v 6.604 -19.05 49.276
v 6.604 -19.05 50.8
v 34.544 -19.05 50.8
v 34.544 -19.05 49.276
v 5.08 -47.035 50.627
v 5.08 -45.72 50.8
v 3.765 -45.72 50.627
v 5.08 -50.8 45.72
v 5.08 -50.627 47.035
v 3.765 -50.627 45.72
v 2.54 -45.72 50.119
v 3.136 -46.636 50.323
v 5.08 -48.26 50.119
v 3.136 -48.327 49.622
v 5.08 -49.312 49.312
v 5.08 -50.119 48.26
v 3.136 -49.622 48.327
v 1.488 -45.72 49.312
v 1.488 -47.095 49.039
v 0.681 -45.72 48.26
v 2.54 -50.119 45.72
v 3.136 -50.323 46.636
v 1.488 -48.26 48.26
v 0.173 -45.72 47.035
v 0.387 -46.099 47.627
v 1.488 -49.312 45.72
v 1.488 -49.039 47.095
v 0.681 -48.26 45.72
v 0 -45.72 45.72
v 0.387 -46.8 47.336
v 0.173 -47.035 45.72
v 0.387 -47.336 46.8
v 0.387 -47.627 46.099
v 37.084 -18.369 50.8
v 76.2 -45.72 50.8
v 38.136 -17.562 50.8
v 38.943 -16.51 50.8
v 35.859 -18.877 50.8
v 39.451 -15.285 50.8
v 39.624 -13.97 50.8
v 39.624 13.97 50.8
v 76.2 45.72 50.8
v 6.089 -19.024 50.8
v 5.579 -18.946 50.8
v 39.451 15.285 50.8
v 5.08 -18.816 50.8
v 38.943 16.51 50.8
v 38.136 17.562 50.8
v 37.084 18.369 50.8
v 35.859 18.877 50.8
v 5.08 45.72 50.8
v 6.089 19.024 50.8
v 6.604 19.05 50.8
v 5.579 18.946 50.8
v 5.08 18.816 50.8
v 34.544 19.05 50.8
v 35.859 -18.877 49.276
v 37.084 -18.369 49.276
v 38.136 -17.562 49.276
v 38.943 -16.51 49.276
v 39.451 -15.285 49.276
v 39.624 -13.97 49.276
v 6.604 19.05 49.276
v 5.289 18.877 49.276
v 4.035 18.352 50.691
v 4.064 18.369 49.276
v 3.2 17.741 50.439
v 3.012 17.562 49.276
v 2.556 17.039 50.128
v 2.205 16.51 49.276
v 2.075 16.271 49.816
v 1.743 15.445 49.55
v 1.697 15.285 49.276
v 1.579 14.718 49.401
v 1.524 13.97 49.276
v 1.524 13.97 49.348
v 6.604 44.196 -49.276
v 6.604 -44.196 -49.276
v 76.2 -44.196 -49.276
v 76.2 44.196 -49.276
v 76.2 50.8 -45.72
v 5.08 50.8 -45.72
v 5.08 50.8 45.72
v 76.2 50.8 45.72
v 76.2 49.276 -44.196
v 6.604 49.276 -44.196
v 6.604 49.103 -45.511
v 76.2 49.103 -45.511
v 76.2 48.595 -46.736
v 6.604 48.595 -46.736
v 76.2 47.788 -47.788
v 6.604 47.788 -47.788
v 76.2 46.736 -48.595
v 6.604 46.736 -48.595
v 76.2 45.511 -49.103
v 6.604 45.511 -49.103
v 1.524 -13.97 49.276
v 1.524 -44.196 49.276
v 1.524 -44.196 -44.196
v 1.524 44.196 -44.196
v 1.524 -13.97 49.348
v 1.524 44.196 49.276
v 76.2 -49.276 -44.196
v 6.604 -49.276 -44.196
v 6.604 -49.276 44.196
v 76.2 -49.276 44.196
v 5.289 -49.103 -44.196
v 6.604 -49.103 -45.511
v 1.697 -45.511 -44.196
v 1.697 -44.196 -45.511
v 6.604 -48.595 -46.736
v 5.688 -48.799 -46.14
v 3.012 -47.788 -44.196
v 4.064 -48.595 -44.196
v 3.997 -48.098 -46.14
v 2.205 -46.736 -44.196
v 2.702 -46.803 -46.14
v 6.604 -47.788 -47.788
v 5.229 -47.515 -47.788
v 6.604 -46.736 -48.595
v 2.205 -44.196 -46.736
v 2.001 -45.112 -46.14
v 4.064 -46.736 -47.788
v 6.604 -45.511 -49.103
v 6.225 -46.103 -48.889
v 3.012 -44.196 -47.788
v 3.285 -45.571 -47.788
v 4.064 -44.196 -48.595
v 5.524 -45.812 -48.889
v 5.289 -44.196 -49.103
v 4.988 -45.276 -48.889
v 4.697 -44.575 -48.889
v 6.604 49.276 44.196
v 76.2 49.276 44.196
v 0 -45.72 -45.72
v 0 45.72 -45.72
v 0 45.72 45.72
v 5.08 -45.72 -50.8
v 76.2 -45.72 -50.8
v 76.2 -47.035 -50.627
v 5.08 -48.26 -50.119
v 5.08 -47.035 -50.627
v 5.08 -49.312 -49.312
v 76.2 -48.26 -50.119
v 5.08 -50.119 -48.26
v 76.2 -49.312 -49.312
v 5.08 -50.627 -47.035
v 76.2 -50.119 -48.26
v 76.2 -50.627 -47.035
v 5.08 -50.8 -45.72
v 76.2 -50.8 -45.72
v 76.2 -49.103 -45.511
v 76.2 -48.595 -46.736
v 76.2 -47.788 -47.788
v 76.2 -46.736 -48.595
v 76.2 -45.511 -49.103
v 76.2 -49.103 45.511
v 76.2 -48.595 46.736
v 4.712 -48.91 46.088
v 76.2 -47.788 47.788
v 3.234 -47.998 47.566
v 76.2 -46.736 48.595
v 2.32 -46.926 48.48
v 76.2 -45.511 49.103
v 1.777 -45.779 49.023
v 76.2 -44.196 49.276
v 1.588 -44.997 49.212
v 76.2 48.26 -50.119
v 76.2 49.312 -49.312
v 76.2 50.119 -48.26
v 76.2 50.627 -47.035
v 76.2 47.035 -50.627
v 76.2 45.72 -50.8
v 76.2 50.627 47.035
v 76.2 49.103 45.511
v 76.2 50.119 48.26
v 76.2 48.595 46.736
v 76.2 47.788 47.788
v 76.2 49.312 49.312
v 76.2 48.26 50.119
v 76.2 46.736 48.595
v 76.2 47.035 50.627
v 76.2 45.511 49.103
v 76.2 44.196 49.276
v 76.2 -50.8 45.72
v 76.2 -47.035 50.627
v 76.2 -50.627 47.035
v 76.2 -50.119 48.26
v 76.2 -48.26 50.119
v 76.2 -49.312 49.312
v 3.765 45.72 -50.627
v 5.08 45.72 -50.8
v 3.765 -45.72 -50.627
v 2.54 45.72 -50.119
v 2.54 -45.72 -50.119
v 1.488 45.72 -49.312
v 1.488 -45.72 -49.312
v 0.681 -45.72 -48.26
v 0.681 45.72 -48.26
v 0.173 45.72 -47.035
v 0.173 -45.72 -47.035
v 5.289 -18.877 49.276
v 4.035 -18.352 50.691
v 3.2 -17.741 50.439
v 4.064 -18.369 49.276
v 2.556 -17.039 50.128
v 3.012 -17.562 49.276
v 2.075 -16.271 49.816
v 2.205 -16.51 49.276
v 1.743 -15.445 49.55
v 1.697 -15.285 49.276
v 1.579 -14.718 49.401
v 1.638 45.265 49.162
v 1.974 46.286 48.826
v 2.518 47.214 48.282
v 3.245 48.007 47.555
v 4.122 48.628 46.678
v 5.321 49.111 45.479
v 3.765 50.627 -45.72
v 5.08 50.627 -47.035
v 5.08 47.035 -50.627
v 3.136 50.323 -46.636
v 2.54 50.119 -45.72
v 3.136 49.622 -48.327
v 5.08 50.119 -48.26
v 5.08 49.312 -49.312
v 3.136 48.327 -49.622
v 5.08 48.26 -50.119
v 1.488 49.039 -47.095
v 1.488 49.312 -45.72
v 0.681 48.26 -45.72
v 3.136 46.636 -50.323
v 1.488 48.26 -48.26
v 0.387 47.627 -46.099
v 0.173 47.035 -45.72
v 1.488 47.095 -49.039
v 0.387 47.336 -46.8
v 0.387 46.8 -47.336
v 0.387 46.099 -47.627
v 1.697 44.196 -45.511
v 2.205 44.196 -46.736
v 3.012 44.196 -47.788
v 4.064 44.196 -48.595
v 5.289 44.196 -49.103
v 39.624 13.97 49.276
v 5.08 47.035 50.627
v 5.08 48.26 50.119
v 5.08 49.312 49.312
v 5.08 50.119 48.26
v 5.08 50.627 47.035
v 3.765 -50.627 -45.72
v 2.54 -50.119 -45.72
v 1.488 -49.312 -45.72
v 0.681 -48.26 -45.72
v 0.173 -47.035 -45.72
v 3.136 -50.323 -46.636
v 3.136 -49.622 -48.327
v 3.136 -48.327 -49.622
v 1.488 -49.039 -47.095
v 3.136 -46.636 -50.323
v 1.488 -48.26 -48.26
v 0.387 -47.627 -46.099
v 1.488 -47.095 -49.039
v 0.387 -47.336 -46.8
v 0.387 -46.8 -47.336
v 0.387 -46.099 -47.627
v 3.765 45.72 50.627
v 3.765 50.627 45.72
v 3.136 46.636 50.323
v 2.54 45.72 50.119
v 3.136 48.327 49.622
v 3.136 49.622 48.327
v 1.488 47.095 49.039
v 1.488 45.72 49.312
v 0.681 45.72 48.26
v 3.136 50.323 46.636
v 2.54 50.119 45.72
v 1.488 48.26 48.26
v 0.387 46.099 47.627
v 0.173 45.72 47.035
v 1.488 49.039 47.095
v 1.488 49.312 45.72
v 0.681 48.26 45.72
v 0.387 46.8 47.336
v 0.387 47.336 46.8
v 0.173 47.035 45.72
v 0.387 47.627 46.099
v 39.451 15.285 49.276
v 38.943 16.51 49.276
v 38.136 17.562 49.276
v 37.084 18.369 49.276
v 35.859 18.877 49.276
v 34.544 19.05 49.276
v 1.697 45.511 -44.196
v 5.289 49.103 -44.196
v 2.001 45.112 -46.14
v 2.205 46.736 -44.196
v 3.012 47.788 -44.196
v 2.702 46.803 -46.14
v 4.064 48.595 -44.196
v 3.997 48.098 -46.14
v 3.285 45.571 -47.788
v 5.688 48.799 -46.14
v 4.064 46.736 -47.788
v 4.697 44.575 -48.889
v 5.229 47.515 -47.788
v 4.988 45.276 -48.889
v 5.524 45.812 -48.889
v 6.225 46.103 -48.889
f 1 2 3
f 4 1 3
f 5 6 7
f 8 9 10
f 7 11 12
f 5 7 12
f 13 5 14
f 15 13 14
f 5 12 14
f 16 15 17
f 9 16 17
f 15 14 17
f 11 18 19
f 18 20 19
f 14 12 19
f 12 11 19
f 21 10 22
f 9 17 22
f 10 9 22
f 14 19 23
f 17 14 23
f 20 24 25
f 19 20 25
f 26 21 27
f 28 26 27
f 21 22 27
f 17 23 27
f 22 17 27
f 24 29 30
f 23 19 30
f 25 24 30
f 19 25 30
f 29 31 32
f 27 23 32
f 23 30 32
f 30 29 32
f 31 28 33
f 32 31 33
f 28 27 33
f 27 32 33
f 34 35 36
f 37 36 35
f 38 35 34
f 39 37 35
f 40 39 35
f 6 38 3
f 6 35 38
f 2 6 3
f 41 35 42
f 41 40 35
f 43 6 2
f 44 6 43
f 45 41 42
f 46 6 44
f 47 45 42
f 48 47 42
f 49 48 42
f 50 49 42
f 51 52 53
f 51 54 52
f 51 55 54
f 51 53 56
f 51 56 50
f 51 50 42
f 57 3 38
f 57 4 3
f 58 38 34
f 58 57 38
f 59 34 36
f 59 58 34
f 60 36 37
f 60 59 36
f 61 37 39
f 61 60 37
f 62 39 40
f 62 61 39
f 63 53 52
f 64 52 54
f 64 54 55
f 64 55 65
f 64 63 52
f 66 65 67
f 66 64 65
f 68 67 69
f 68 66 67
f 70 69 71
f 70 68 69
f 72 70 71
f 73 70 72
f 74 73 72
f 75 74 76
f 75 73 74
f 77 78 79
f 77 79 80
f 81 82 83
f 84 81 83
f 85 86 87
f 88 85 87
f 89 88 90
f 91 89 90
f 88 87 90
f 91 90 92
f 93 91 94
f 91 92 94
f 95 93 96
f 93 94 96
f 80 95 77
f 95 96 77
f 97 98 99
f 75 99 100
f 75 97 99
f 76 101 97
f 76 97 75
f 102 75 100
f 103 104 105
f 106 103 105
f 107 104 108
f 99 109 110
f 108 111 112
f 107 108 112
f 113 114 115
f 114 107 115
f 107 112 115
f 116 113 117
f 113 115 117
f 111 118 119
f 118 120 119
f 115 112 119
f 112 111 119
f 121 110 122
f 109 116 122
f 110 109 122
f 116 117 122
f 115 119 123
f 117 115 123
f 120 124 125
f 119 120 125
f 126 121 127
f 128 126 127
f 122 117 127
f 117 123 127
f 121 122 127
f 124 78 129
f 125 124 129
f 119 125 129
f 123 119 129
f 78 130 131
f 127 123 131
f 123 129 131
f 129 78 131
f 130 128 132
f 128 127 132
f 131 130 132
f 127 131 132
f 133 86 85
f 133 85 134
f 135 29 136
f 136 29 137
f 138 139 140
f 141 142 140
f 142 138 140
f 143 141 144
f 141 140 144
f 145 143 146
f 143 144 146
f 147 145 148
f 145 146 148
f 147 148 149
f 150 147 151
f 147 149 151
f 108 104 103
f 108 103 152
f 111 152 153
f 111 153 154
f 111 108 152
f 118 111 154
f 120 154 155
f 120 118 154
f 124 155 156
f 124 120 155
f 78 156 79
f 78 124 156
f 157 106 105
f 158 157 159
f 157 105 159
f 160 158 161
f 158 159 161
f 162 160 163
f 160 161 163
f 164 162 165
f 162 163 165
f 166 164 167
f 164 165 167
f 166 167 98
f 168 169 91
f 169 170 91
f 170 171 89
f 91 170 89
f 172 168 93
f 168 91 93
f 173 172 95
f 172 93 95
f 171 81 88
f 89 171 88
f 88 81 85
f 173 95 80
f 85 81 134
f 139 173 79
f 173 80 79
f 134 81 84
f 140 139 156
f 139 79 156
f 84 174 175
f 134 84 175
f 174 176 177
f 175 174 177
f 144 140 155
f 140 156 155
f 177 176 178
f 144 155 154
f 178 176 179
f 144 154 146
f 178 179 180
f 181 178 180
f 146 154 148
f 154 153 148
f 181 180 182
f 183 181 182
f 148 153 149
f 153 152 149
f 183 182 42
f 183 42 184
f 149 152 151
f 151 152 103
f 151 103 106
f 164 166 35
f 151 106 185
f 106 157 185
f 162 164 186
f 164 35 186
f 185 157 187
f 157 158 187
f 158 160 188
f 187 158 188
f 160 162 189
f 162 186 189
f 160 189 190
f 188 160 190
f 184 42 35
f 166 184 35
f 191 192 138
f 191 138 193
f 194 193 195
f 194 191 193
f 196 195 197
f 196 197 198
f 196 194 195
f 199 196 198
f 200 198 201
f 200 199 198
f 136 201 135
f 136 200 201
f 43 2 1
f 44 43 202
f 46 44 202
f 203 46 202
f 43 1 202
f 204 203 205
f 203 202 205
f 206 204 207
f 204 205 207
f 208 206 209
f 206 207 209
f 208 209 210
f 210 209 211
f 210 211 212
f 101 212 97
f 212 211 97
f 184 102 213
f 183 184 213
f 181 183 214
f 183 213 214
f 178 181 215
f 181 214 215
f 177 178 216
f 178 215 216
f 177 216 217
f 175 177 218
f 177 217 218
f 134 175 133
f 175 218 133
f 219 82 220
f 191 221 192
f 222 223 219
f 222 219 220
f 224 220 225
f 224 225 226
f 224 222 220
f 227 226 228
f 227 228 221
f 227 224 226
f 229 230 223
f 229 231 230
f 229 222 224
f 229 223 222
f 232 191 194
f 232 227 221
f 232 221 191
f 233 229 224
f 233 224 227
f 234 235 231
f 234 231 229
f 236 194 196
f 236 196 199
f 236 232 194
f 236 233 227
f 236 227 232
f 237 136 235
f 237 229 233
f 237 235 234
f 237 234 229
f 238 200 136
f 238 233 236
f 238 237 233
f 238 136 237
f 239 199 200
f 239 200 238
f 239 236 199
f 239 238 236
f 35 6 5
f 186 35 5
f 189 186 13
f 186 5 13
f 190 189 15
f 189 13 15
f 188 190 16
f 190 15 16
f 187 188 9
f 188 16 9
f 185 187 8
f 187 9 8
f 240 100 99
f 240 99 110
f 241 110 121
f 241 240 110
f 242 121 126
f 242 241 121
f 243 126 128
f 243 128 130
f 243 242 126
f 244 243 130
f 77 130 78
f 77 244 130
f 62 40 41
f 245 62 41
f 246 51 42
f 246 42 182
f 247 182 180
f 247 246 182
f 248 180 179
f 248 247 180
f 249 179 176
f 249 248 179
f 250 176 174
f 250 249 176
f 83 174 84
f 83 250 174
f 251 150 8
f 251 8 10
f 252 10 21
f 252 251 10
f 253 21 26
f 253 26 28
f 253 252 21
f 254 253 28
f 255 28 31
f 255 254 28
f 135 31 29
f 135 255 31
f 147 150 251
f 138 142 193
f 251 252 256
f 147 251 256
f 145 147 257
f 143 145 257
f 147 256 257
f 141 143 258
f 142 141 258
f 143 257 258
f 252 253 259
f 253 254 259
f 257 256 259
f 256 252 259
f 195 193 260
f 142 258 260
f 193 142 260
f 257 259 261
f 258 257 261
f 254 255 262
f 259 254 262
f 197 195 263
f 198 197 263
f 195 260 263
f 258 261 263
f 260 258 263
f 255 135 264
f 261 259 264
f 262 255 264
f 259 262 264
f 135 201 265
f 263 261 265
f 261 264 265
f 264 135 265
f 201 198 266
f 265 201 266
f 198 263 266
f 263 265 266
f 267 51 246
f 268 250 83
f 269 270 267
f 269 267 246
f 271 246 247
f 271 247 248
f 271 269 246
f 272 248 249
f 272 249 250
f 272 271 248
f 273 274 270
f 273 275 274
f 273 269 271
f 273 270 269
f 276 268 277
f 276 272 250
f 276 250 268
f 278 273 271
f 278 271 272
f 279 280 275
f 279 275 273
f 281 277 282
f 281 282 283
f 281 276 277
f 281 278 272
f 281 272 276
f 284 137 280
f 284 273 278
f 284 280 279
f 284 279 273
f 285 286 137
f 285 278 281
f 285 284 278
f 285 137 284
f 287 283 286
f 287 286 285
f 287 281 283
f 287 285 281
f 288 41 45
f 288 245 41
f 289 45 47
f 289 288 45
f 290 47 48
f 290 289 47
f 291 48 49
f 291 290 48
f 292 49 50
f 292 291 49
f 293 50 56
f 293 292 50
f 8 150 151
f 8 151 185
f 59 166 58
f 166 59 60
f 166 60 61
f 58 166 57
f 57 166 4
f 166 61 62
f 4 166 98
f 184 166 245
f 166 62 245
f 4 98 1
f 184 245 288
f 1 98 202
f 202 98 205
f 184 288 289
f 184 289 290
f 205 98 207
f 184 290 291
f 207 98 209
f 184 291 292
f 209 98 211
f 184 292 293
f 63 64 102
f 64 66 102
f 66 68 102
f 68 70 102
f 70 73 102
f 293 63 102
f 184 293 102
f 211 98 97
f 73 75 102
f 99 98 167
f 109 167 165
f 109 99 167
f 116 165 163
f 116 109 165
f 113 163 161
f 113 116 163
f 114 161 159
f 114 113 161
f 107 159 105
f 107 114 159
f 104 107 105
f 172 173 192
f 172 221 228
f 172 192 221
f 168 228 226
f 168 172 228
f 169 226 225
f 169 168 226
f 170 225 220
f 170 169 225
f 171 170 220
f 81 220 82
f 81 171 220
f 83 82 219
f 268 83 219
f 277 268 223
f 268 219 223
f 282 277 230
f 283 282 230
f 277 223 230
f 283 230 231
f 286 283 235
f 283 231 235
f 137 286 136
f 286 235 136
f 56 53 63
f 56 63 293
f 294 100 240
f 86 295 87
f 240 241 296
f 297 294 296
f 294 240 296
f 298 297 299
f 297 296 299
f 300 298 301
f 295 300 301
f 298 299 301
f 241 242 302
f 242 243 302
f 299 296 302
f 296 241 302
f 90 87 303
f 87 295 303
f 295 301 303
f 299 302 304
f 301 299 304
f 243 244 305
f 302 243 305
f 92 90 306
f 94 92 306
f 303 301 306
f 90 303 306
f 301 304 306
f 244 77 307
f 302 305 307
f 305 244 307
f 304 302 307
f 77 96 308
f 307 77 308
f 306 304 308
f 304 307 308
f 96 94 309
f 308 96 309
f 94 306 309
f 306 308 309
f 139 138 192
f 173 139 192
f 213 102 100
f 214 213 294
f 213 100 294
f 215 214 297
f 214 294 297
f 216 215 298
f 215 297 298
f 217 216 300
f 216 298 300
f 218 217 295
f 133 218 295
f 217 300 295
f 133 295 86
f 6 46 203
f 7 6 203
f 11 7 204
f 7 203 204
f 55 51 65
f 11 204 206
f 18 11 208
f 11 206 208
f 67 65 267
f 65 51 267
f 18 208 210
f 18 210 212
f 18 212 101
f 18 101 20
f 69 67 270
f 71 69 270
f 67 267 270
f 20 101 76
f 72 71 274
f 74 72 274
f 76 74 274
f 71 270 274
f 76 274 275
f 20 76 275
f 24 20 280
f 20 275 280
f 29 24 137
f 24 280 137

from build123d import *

# Parameters (mm, degrees)
F0_W          = 101.6
F0_H          = 101.6
F0_W_2        = 98.552
F0_H_2        = 98.552
F1_DEPTH      = 76.2
F2_W          = 101.6
F2_H          = 101.6
F3_DEPTH      = 1.524
F4_W          = 38.1
F4_H          = 38.1
F5_DEPTH      = 1.524
F6_R          = 5.08
F7_R          = 5.08
F10_T1_DEPTH  = 93.472
F10_T3_DEPTH  = 88.392
F10_T5_DEPTH  = 74.676
F10_T7_DEPTH  = 69.596
F10_S11_W     = 5.08
F10_S11_H     = 5.08
F10_T12_DEPTH = 5.08
F10_S17_W     = 5.08
F10_S17_H     = 5.08
F10_T18_DEPTH = 5.08
F10_T21_DEPTH = 91.44
F10_T23_DEPTH = 91.44
F10_T26_ANGLE = 90
F10_T28_ANGLE = 90
F10_T30_ANGLE = 90
F10_T32_ANGLE = 90


# Not quite as in the source:
# - a fillet or chamfer that OpenCascade refuses, or shapes differently, is made with other operations: its cross-section is extruded or revolved along the edge and cut away or added
# - a feature of the source that left no trace in its solid (it failed there, or was rolled back) is left out


with BuildPart() as f1:
    # F0 (on Right) → F1 (new body)
    with BuildSketch(Plane.YZ):
        Rectangle(F0_W, F0_H)
        Rectangle(F0_W_2, F0_H_2, mode=Mode.SUBTRACT)
    extrude(amount=F1_DEPTH)

    # F2 (on Right) → F3 (join)
    with BuildSketch(Plane.YZ):
        Rectangle(F2_W, F2_H)
    extrude(amount=F3_DEPTH)

    # F4 (on face) → F5 (cut)
    with BuildSketch(Plane.XY.offset(50.8)):
        with Locations((20.574, 0)):
            Rectangle(F4_W, F4_H)
    extrude(amount=-F5_DEPTH, mode=Mode.SUBTRACT)

    # F6
    f6_edges = [f1.edges().sort_by_distance(p)[0] for p in [
        (39.624, 19.05, 50.038),
        (39.624, -19.05, 50.038),
        (1.524, -19.05, 50.038),
        (1.524, 19.05, 50.038),
    ]]
    fillet(f6_edges, radius=F6_R)

    # F7
    f7_edges = [f1.edges().sort_by_distance(p)[0] for p in [
        (38.1, 50.8, 50.8),
        (38.1, -50.8, 50.8),
        (38.1, -50.8, -50.8),
        (38.1, 50.8, -50.8),
    ]]
    fillet(f7_edges, radius=F7_R)

    # F10: fillet of radius 5.08 on 15 edges, made by hand

    # F10_s2 → F10_t1 (join)
    with BuildSketch(Plane.XY.offset(-44.196)):
        with BuildLine():
            ThreePointArc((1.524, 44.196), (3.0118975516, 47.7881024484), (6.604, 49.276))
            Line((6.604, 49.276), (1.524, 49.276))
            Line((1.524, 49.276), (1.524, 44.196))
        make_face()
        with BuildLine():
            ThreePointArc((1.524, -44.196), (3.0118975516, -47.7881024484), (6.604, -49.276))
            Line((6.604, -49.276), (1.524, -49.276))
            Line((1.524, -49.276), (1.524, -44.196))
        make_face()
    extrude(amount=F10_T1_DEPTH)

    # F10_s4 → F10_t3 (join)
    with BuildSketch(Plane.XZ.offset(-44.196)):
        with BuildLine():
            ThreePointArc((1.524, -44.196), (3.0118975516, -47.7881024484), (6.604, -49.276))
            Line((6.604, -49.276), (1.524, -49.276))
            Line((1.524, -49.276), (1.524, -44.196))
        make_face()
    extrude(amount=F10_T3_DEPTH)

    # F10_s6 → F10_t5 (join)
    with BuildSketch(Plane.YZ.offset(1.524)):
        with BuildLine():
            ThreePointArc((-49.276, 44.196), (-47.7881024484, 47.7881024484), (-44.196, 49.276))
            Line((-44.196, 49.276), (-49.276, 49.276))
            Line((-49.276, 49.276), (-49.276, 44.196))
        make_face()
        with BuildLine():
            ThreePointArc((44.196, 49.276), (47.7881024484, 47.7881024484), (49.276, 44.196))
            Line((49.276, 44.196), (49.276, 49.276))
            Line((49.276, 49.276), (44.196, 49.276))
        make_face()
    extrude(amount=F10_T5_DEPTH)

    # F10_s8 → F10_t7 (join)
    with BuildSketch(Plane.YZ.offset(6.604)):
        with BuildLine():
            ThreePointArc((-49.276, -44.196), (-47.7881024484, -47.7881024484), (-44.196, -49.276))
            Line((-44.196, -49.276), (-49.276, -49.276))
            Line((-49.276, -49.276), (-49.276, -44.196))
        make_face()
        with BuildLine():
            ThreePointArc((49.276, -44.196), (47.7881024484, -47.7881024484), (44.196, -49.276))
            Line((44.196, -49.276), (49.276, -49.276))
            Line((49.276, -49.276), (49.276, -44.196))
        make_face()
    extrude(amount=F10_T7_DEPTH)


with BuildPart() as f10_tool10:
    # F10_s11 → F10_t12 (new body)
    with BuildSketch(Plane.XY.offset(-44.196)):
        with Locations((4.064, 46.736)):
            Rectangle(F10_S11_W, F10_S11_H)
    extrude(amount=-F10_T12_DEPTH)

    # F10_s13 → F10_t14 (revolve, cut)
    with BuildSketch(Plane(origin=(6.604, 44.196, -44.196), x_dir=(0.7071067812, -0.7071067812, 0), z_dir=(0.7071067812, 0.7071067812, 0))):
        with BuildLine():
            ThreePointArc((0, -5.08), (5.08, 0), (0, 5.08))
            Line((0, 5.08), (0, -5.08))
        make_face()
    revolve(axis=Axis((6.604, 44.196, -44.196), (0, 0, -1)), mode=Mode.SUBTRACT)


with BuildPart() as f1_1:
    add(f1.part)

    # F10_t9: union F10_tool10
    add(f10_tool10.part)


with BuildPart() as f10_tool16:
    # F10_s17 → F10_t18 (new body)
    with BuildSketch(Plane.XY.offset(-44.196)):
        with Locations((4.064, -46.736)):
            Rectangle(F10_S17_W, F10_S17_H)
    extrude(amount=-F10_T18_DEPTH)

    # F10_s19 → F10_t20 (revolve, cut)
    with BuildSketch(Plane(origin=(6.604, -44.196, -44.196), x_dir=(0.7071067812, 0.7071067812, 0), z_dir=(-0.7071067812, 0.7071067812, 0))):
        with BuildLine():
            ThreePointArc((0, -5.08), (5.08, 0), (0, 5.08))
            Line((0, 5.08), (0, -5.08))
        make_face()
    revolve(axis=Axis((6.604, -44.196, -44.196), (0, 0, -1)), mode=Mode.SUBTRACT)


with BuildPart() as f1_2:
    add(f1_1.part)

    # F10_t15: union F10_tool16
    add(f10_tool16.part)

    # F10_s22 → F10_t21 (cut)
    with BuildSketch(Plane.XZ.offset(-45.72)):
        with BuildLine():
            ThreePointArc((5.08, 50.8), (1.4878975516, 49.3121024484), (0, 45.72))
            Line((0, 45.72), (0, 50.8))
            Line((0, 50.8), (5.08, 50.8))
        make_face()
        with BuildLine():
            ThreePointArc((5.08, -50.8), (1.4878975516, -49.3121024484), (0, -45.72))
            Line((0, -45.72), (0, -50.8))
            Line((0, -50.8), (5.08, -50.8))
        make_face()
    extrude(amount=F10_T21_DEPTH, mode=Mode.SUBTRACT)

    # F10_s24 → F10_t23 (cut)
    with BuildSketch(Plane.XY.offset(-45.72)):
        with BuildLine():
            ThreePointArc((5.08, 50.8), (1.4878975516, 49.3121024484), (0, 45.72))
            Line((0, 45.72), (0, 50.8))
            Line((0, 50.8), (5.08, 50.8))
        make_face()
        with BuildLine():
            ThreePointArc((5.08, -50.8), (1.4878975516, -49.3121024484), (0, -45.72))
            Line((0, -45.72), (0, -50.8))
            Line((0, -50.8), (5.08, -50.8))
        make_face()
    extrude(amount=F10_T23_DEPTH, mode=Mode.SUBTRACT)

    # F10_s25 → F10_t26 (revolve, cut)
    with BuildSketch(Plane.XY.offset(-45.72)):
        with BuildLine():
            ThreePointArc((5.08, 50.8), (1.4878975516, 49.3121024484), (0, 45.72))
            Line((0, 45.72), (0, 50.8))
            Line((0, 50.8), (5.08, 50.8))
        make_face()
    revolve(axis=Axis((0, 45.72, -45.72), (-1, 0, 0)), revolution_arc=F10_T26_ANGLE, mode=Mode.SUBTRACT)

    # F10_s27 → F10_t28 (revolve, cut)
    with BuildSketch(Plane.XZ.offset(-45.72)):
        with BuildLine():
            ThreePointArc((5.08, 50.8), (1.4878975516, 49.3121024484), (0, 45.72))
            Line((0, 45.72), (0, 50.8))
            Line((0, 50.8), (5.08, 50.8))
        make_face()
    revolve(axis=Axis((0, 45.72, 45.72), (-1, 0, 0)), revolution_arc=F10_T28_ANGLE, mode=Mode.SUBTRACT)

    # F10_s29 → F10_t30 (revolve, cut)
    with BuildSketch(Plane.XY.offset(-45.72)):
        with BuildLine():
            ThreePointArc((5.08, -50.8), (1.4878975516, -49.3121024484), (0, -45.72))
            Line((0, -45.72), (0, -50.8))
            Line((0, -50.8), (5.08, -50.8))
        make_face()
    revolve(axis=Axis((0, -45.72, -45.72), (1, 0, 0)), revolution_arc=F10_T30_ANGLE, mode=Mode.SUBTRACT)

    # F10_s31 → F10_t32 (revolve, cut)
    with BuildSketch(Plane.XZ.offset(45.72)):
        with BuildLine():
            ThreePointArc((5.08, 50.8), (1.4878975516, 49.3121024484), (0, 45.72))
            Line((0, 45.72), (0, 50.8))
            Line((0, 50.8), (5.08, 50.8))
        make_face()
    revolve(axis=Axis((0, -45.72, 45.72), (1, 0, 0)), revolution_arc=F10_T32_ANGLE, mode=Mode.SUBTRACT)


solid = f1_2.part
